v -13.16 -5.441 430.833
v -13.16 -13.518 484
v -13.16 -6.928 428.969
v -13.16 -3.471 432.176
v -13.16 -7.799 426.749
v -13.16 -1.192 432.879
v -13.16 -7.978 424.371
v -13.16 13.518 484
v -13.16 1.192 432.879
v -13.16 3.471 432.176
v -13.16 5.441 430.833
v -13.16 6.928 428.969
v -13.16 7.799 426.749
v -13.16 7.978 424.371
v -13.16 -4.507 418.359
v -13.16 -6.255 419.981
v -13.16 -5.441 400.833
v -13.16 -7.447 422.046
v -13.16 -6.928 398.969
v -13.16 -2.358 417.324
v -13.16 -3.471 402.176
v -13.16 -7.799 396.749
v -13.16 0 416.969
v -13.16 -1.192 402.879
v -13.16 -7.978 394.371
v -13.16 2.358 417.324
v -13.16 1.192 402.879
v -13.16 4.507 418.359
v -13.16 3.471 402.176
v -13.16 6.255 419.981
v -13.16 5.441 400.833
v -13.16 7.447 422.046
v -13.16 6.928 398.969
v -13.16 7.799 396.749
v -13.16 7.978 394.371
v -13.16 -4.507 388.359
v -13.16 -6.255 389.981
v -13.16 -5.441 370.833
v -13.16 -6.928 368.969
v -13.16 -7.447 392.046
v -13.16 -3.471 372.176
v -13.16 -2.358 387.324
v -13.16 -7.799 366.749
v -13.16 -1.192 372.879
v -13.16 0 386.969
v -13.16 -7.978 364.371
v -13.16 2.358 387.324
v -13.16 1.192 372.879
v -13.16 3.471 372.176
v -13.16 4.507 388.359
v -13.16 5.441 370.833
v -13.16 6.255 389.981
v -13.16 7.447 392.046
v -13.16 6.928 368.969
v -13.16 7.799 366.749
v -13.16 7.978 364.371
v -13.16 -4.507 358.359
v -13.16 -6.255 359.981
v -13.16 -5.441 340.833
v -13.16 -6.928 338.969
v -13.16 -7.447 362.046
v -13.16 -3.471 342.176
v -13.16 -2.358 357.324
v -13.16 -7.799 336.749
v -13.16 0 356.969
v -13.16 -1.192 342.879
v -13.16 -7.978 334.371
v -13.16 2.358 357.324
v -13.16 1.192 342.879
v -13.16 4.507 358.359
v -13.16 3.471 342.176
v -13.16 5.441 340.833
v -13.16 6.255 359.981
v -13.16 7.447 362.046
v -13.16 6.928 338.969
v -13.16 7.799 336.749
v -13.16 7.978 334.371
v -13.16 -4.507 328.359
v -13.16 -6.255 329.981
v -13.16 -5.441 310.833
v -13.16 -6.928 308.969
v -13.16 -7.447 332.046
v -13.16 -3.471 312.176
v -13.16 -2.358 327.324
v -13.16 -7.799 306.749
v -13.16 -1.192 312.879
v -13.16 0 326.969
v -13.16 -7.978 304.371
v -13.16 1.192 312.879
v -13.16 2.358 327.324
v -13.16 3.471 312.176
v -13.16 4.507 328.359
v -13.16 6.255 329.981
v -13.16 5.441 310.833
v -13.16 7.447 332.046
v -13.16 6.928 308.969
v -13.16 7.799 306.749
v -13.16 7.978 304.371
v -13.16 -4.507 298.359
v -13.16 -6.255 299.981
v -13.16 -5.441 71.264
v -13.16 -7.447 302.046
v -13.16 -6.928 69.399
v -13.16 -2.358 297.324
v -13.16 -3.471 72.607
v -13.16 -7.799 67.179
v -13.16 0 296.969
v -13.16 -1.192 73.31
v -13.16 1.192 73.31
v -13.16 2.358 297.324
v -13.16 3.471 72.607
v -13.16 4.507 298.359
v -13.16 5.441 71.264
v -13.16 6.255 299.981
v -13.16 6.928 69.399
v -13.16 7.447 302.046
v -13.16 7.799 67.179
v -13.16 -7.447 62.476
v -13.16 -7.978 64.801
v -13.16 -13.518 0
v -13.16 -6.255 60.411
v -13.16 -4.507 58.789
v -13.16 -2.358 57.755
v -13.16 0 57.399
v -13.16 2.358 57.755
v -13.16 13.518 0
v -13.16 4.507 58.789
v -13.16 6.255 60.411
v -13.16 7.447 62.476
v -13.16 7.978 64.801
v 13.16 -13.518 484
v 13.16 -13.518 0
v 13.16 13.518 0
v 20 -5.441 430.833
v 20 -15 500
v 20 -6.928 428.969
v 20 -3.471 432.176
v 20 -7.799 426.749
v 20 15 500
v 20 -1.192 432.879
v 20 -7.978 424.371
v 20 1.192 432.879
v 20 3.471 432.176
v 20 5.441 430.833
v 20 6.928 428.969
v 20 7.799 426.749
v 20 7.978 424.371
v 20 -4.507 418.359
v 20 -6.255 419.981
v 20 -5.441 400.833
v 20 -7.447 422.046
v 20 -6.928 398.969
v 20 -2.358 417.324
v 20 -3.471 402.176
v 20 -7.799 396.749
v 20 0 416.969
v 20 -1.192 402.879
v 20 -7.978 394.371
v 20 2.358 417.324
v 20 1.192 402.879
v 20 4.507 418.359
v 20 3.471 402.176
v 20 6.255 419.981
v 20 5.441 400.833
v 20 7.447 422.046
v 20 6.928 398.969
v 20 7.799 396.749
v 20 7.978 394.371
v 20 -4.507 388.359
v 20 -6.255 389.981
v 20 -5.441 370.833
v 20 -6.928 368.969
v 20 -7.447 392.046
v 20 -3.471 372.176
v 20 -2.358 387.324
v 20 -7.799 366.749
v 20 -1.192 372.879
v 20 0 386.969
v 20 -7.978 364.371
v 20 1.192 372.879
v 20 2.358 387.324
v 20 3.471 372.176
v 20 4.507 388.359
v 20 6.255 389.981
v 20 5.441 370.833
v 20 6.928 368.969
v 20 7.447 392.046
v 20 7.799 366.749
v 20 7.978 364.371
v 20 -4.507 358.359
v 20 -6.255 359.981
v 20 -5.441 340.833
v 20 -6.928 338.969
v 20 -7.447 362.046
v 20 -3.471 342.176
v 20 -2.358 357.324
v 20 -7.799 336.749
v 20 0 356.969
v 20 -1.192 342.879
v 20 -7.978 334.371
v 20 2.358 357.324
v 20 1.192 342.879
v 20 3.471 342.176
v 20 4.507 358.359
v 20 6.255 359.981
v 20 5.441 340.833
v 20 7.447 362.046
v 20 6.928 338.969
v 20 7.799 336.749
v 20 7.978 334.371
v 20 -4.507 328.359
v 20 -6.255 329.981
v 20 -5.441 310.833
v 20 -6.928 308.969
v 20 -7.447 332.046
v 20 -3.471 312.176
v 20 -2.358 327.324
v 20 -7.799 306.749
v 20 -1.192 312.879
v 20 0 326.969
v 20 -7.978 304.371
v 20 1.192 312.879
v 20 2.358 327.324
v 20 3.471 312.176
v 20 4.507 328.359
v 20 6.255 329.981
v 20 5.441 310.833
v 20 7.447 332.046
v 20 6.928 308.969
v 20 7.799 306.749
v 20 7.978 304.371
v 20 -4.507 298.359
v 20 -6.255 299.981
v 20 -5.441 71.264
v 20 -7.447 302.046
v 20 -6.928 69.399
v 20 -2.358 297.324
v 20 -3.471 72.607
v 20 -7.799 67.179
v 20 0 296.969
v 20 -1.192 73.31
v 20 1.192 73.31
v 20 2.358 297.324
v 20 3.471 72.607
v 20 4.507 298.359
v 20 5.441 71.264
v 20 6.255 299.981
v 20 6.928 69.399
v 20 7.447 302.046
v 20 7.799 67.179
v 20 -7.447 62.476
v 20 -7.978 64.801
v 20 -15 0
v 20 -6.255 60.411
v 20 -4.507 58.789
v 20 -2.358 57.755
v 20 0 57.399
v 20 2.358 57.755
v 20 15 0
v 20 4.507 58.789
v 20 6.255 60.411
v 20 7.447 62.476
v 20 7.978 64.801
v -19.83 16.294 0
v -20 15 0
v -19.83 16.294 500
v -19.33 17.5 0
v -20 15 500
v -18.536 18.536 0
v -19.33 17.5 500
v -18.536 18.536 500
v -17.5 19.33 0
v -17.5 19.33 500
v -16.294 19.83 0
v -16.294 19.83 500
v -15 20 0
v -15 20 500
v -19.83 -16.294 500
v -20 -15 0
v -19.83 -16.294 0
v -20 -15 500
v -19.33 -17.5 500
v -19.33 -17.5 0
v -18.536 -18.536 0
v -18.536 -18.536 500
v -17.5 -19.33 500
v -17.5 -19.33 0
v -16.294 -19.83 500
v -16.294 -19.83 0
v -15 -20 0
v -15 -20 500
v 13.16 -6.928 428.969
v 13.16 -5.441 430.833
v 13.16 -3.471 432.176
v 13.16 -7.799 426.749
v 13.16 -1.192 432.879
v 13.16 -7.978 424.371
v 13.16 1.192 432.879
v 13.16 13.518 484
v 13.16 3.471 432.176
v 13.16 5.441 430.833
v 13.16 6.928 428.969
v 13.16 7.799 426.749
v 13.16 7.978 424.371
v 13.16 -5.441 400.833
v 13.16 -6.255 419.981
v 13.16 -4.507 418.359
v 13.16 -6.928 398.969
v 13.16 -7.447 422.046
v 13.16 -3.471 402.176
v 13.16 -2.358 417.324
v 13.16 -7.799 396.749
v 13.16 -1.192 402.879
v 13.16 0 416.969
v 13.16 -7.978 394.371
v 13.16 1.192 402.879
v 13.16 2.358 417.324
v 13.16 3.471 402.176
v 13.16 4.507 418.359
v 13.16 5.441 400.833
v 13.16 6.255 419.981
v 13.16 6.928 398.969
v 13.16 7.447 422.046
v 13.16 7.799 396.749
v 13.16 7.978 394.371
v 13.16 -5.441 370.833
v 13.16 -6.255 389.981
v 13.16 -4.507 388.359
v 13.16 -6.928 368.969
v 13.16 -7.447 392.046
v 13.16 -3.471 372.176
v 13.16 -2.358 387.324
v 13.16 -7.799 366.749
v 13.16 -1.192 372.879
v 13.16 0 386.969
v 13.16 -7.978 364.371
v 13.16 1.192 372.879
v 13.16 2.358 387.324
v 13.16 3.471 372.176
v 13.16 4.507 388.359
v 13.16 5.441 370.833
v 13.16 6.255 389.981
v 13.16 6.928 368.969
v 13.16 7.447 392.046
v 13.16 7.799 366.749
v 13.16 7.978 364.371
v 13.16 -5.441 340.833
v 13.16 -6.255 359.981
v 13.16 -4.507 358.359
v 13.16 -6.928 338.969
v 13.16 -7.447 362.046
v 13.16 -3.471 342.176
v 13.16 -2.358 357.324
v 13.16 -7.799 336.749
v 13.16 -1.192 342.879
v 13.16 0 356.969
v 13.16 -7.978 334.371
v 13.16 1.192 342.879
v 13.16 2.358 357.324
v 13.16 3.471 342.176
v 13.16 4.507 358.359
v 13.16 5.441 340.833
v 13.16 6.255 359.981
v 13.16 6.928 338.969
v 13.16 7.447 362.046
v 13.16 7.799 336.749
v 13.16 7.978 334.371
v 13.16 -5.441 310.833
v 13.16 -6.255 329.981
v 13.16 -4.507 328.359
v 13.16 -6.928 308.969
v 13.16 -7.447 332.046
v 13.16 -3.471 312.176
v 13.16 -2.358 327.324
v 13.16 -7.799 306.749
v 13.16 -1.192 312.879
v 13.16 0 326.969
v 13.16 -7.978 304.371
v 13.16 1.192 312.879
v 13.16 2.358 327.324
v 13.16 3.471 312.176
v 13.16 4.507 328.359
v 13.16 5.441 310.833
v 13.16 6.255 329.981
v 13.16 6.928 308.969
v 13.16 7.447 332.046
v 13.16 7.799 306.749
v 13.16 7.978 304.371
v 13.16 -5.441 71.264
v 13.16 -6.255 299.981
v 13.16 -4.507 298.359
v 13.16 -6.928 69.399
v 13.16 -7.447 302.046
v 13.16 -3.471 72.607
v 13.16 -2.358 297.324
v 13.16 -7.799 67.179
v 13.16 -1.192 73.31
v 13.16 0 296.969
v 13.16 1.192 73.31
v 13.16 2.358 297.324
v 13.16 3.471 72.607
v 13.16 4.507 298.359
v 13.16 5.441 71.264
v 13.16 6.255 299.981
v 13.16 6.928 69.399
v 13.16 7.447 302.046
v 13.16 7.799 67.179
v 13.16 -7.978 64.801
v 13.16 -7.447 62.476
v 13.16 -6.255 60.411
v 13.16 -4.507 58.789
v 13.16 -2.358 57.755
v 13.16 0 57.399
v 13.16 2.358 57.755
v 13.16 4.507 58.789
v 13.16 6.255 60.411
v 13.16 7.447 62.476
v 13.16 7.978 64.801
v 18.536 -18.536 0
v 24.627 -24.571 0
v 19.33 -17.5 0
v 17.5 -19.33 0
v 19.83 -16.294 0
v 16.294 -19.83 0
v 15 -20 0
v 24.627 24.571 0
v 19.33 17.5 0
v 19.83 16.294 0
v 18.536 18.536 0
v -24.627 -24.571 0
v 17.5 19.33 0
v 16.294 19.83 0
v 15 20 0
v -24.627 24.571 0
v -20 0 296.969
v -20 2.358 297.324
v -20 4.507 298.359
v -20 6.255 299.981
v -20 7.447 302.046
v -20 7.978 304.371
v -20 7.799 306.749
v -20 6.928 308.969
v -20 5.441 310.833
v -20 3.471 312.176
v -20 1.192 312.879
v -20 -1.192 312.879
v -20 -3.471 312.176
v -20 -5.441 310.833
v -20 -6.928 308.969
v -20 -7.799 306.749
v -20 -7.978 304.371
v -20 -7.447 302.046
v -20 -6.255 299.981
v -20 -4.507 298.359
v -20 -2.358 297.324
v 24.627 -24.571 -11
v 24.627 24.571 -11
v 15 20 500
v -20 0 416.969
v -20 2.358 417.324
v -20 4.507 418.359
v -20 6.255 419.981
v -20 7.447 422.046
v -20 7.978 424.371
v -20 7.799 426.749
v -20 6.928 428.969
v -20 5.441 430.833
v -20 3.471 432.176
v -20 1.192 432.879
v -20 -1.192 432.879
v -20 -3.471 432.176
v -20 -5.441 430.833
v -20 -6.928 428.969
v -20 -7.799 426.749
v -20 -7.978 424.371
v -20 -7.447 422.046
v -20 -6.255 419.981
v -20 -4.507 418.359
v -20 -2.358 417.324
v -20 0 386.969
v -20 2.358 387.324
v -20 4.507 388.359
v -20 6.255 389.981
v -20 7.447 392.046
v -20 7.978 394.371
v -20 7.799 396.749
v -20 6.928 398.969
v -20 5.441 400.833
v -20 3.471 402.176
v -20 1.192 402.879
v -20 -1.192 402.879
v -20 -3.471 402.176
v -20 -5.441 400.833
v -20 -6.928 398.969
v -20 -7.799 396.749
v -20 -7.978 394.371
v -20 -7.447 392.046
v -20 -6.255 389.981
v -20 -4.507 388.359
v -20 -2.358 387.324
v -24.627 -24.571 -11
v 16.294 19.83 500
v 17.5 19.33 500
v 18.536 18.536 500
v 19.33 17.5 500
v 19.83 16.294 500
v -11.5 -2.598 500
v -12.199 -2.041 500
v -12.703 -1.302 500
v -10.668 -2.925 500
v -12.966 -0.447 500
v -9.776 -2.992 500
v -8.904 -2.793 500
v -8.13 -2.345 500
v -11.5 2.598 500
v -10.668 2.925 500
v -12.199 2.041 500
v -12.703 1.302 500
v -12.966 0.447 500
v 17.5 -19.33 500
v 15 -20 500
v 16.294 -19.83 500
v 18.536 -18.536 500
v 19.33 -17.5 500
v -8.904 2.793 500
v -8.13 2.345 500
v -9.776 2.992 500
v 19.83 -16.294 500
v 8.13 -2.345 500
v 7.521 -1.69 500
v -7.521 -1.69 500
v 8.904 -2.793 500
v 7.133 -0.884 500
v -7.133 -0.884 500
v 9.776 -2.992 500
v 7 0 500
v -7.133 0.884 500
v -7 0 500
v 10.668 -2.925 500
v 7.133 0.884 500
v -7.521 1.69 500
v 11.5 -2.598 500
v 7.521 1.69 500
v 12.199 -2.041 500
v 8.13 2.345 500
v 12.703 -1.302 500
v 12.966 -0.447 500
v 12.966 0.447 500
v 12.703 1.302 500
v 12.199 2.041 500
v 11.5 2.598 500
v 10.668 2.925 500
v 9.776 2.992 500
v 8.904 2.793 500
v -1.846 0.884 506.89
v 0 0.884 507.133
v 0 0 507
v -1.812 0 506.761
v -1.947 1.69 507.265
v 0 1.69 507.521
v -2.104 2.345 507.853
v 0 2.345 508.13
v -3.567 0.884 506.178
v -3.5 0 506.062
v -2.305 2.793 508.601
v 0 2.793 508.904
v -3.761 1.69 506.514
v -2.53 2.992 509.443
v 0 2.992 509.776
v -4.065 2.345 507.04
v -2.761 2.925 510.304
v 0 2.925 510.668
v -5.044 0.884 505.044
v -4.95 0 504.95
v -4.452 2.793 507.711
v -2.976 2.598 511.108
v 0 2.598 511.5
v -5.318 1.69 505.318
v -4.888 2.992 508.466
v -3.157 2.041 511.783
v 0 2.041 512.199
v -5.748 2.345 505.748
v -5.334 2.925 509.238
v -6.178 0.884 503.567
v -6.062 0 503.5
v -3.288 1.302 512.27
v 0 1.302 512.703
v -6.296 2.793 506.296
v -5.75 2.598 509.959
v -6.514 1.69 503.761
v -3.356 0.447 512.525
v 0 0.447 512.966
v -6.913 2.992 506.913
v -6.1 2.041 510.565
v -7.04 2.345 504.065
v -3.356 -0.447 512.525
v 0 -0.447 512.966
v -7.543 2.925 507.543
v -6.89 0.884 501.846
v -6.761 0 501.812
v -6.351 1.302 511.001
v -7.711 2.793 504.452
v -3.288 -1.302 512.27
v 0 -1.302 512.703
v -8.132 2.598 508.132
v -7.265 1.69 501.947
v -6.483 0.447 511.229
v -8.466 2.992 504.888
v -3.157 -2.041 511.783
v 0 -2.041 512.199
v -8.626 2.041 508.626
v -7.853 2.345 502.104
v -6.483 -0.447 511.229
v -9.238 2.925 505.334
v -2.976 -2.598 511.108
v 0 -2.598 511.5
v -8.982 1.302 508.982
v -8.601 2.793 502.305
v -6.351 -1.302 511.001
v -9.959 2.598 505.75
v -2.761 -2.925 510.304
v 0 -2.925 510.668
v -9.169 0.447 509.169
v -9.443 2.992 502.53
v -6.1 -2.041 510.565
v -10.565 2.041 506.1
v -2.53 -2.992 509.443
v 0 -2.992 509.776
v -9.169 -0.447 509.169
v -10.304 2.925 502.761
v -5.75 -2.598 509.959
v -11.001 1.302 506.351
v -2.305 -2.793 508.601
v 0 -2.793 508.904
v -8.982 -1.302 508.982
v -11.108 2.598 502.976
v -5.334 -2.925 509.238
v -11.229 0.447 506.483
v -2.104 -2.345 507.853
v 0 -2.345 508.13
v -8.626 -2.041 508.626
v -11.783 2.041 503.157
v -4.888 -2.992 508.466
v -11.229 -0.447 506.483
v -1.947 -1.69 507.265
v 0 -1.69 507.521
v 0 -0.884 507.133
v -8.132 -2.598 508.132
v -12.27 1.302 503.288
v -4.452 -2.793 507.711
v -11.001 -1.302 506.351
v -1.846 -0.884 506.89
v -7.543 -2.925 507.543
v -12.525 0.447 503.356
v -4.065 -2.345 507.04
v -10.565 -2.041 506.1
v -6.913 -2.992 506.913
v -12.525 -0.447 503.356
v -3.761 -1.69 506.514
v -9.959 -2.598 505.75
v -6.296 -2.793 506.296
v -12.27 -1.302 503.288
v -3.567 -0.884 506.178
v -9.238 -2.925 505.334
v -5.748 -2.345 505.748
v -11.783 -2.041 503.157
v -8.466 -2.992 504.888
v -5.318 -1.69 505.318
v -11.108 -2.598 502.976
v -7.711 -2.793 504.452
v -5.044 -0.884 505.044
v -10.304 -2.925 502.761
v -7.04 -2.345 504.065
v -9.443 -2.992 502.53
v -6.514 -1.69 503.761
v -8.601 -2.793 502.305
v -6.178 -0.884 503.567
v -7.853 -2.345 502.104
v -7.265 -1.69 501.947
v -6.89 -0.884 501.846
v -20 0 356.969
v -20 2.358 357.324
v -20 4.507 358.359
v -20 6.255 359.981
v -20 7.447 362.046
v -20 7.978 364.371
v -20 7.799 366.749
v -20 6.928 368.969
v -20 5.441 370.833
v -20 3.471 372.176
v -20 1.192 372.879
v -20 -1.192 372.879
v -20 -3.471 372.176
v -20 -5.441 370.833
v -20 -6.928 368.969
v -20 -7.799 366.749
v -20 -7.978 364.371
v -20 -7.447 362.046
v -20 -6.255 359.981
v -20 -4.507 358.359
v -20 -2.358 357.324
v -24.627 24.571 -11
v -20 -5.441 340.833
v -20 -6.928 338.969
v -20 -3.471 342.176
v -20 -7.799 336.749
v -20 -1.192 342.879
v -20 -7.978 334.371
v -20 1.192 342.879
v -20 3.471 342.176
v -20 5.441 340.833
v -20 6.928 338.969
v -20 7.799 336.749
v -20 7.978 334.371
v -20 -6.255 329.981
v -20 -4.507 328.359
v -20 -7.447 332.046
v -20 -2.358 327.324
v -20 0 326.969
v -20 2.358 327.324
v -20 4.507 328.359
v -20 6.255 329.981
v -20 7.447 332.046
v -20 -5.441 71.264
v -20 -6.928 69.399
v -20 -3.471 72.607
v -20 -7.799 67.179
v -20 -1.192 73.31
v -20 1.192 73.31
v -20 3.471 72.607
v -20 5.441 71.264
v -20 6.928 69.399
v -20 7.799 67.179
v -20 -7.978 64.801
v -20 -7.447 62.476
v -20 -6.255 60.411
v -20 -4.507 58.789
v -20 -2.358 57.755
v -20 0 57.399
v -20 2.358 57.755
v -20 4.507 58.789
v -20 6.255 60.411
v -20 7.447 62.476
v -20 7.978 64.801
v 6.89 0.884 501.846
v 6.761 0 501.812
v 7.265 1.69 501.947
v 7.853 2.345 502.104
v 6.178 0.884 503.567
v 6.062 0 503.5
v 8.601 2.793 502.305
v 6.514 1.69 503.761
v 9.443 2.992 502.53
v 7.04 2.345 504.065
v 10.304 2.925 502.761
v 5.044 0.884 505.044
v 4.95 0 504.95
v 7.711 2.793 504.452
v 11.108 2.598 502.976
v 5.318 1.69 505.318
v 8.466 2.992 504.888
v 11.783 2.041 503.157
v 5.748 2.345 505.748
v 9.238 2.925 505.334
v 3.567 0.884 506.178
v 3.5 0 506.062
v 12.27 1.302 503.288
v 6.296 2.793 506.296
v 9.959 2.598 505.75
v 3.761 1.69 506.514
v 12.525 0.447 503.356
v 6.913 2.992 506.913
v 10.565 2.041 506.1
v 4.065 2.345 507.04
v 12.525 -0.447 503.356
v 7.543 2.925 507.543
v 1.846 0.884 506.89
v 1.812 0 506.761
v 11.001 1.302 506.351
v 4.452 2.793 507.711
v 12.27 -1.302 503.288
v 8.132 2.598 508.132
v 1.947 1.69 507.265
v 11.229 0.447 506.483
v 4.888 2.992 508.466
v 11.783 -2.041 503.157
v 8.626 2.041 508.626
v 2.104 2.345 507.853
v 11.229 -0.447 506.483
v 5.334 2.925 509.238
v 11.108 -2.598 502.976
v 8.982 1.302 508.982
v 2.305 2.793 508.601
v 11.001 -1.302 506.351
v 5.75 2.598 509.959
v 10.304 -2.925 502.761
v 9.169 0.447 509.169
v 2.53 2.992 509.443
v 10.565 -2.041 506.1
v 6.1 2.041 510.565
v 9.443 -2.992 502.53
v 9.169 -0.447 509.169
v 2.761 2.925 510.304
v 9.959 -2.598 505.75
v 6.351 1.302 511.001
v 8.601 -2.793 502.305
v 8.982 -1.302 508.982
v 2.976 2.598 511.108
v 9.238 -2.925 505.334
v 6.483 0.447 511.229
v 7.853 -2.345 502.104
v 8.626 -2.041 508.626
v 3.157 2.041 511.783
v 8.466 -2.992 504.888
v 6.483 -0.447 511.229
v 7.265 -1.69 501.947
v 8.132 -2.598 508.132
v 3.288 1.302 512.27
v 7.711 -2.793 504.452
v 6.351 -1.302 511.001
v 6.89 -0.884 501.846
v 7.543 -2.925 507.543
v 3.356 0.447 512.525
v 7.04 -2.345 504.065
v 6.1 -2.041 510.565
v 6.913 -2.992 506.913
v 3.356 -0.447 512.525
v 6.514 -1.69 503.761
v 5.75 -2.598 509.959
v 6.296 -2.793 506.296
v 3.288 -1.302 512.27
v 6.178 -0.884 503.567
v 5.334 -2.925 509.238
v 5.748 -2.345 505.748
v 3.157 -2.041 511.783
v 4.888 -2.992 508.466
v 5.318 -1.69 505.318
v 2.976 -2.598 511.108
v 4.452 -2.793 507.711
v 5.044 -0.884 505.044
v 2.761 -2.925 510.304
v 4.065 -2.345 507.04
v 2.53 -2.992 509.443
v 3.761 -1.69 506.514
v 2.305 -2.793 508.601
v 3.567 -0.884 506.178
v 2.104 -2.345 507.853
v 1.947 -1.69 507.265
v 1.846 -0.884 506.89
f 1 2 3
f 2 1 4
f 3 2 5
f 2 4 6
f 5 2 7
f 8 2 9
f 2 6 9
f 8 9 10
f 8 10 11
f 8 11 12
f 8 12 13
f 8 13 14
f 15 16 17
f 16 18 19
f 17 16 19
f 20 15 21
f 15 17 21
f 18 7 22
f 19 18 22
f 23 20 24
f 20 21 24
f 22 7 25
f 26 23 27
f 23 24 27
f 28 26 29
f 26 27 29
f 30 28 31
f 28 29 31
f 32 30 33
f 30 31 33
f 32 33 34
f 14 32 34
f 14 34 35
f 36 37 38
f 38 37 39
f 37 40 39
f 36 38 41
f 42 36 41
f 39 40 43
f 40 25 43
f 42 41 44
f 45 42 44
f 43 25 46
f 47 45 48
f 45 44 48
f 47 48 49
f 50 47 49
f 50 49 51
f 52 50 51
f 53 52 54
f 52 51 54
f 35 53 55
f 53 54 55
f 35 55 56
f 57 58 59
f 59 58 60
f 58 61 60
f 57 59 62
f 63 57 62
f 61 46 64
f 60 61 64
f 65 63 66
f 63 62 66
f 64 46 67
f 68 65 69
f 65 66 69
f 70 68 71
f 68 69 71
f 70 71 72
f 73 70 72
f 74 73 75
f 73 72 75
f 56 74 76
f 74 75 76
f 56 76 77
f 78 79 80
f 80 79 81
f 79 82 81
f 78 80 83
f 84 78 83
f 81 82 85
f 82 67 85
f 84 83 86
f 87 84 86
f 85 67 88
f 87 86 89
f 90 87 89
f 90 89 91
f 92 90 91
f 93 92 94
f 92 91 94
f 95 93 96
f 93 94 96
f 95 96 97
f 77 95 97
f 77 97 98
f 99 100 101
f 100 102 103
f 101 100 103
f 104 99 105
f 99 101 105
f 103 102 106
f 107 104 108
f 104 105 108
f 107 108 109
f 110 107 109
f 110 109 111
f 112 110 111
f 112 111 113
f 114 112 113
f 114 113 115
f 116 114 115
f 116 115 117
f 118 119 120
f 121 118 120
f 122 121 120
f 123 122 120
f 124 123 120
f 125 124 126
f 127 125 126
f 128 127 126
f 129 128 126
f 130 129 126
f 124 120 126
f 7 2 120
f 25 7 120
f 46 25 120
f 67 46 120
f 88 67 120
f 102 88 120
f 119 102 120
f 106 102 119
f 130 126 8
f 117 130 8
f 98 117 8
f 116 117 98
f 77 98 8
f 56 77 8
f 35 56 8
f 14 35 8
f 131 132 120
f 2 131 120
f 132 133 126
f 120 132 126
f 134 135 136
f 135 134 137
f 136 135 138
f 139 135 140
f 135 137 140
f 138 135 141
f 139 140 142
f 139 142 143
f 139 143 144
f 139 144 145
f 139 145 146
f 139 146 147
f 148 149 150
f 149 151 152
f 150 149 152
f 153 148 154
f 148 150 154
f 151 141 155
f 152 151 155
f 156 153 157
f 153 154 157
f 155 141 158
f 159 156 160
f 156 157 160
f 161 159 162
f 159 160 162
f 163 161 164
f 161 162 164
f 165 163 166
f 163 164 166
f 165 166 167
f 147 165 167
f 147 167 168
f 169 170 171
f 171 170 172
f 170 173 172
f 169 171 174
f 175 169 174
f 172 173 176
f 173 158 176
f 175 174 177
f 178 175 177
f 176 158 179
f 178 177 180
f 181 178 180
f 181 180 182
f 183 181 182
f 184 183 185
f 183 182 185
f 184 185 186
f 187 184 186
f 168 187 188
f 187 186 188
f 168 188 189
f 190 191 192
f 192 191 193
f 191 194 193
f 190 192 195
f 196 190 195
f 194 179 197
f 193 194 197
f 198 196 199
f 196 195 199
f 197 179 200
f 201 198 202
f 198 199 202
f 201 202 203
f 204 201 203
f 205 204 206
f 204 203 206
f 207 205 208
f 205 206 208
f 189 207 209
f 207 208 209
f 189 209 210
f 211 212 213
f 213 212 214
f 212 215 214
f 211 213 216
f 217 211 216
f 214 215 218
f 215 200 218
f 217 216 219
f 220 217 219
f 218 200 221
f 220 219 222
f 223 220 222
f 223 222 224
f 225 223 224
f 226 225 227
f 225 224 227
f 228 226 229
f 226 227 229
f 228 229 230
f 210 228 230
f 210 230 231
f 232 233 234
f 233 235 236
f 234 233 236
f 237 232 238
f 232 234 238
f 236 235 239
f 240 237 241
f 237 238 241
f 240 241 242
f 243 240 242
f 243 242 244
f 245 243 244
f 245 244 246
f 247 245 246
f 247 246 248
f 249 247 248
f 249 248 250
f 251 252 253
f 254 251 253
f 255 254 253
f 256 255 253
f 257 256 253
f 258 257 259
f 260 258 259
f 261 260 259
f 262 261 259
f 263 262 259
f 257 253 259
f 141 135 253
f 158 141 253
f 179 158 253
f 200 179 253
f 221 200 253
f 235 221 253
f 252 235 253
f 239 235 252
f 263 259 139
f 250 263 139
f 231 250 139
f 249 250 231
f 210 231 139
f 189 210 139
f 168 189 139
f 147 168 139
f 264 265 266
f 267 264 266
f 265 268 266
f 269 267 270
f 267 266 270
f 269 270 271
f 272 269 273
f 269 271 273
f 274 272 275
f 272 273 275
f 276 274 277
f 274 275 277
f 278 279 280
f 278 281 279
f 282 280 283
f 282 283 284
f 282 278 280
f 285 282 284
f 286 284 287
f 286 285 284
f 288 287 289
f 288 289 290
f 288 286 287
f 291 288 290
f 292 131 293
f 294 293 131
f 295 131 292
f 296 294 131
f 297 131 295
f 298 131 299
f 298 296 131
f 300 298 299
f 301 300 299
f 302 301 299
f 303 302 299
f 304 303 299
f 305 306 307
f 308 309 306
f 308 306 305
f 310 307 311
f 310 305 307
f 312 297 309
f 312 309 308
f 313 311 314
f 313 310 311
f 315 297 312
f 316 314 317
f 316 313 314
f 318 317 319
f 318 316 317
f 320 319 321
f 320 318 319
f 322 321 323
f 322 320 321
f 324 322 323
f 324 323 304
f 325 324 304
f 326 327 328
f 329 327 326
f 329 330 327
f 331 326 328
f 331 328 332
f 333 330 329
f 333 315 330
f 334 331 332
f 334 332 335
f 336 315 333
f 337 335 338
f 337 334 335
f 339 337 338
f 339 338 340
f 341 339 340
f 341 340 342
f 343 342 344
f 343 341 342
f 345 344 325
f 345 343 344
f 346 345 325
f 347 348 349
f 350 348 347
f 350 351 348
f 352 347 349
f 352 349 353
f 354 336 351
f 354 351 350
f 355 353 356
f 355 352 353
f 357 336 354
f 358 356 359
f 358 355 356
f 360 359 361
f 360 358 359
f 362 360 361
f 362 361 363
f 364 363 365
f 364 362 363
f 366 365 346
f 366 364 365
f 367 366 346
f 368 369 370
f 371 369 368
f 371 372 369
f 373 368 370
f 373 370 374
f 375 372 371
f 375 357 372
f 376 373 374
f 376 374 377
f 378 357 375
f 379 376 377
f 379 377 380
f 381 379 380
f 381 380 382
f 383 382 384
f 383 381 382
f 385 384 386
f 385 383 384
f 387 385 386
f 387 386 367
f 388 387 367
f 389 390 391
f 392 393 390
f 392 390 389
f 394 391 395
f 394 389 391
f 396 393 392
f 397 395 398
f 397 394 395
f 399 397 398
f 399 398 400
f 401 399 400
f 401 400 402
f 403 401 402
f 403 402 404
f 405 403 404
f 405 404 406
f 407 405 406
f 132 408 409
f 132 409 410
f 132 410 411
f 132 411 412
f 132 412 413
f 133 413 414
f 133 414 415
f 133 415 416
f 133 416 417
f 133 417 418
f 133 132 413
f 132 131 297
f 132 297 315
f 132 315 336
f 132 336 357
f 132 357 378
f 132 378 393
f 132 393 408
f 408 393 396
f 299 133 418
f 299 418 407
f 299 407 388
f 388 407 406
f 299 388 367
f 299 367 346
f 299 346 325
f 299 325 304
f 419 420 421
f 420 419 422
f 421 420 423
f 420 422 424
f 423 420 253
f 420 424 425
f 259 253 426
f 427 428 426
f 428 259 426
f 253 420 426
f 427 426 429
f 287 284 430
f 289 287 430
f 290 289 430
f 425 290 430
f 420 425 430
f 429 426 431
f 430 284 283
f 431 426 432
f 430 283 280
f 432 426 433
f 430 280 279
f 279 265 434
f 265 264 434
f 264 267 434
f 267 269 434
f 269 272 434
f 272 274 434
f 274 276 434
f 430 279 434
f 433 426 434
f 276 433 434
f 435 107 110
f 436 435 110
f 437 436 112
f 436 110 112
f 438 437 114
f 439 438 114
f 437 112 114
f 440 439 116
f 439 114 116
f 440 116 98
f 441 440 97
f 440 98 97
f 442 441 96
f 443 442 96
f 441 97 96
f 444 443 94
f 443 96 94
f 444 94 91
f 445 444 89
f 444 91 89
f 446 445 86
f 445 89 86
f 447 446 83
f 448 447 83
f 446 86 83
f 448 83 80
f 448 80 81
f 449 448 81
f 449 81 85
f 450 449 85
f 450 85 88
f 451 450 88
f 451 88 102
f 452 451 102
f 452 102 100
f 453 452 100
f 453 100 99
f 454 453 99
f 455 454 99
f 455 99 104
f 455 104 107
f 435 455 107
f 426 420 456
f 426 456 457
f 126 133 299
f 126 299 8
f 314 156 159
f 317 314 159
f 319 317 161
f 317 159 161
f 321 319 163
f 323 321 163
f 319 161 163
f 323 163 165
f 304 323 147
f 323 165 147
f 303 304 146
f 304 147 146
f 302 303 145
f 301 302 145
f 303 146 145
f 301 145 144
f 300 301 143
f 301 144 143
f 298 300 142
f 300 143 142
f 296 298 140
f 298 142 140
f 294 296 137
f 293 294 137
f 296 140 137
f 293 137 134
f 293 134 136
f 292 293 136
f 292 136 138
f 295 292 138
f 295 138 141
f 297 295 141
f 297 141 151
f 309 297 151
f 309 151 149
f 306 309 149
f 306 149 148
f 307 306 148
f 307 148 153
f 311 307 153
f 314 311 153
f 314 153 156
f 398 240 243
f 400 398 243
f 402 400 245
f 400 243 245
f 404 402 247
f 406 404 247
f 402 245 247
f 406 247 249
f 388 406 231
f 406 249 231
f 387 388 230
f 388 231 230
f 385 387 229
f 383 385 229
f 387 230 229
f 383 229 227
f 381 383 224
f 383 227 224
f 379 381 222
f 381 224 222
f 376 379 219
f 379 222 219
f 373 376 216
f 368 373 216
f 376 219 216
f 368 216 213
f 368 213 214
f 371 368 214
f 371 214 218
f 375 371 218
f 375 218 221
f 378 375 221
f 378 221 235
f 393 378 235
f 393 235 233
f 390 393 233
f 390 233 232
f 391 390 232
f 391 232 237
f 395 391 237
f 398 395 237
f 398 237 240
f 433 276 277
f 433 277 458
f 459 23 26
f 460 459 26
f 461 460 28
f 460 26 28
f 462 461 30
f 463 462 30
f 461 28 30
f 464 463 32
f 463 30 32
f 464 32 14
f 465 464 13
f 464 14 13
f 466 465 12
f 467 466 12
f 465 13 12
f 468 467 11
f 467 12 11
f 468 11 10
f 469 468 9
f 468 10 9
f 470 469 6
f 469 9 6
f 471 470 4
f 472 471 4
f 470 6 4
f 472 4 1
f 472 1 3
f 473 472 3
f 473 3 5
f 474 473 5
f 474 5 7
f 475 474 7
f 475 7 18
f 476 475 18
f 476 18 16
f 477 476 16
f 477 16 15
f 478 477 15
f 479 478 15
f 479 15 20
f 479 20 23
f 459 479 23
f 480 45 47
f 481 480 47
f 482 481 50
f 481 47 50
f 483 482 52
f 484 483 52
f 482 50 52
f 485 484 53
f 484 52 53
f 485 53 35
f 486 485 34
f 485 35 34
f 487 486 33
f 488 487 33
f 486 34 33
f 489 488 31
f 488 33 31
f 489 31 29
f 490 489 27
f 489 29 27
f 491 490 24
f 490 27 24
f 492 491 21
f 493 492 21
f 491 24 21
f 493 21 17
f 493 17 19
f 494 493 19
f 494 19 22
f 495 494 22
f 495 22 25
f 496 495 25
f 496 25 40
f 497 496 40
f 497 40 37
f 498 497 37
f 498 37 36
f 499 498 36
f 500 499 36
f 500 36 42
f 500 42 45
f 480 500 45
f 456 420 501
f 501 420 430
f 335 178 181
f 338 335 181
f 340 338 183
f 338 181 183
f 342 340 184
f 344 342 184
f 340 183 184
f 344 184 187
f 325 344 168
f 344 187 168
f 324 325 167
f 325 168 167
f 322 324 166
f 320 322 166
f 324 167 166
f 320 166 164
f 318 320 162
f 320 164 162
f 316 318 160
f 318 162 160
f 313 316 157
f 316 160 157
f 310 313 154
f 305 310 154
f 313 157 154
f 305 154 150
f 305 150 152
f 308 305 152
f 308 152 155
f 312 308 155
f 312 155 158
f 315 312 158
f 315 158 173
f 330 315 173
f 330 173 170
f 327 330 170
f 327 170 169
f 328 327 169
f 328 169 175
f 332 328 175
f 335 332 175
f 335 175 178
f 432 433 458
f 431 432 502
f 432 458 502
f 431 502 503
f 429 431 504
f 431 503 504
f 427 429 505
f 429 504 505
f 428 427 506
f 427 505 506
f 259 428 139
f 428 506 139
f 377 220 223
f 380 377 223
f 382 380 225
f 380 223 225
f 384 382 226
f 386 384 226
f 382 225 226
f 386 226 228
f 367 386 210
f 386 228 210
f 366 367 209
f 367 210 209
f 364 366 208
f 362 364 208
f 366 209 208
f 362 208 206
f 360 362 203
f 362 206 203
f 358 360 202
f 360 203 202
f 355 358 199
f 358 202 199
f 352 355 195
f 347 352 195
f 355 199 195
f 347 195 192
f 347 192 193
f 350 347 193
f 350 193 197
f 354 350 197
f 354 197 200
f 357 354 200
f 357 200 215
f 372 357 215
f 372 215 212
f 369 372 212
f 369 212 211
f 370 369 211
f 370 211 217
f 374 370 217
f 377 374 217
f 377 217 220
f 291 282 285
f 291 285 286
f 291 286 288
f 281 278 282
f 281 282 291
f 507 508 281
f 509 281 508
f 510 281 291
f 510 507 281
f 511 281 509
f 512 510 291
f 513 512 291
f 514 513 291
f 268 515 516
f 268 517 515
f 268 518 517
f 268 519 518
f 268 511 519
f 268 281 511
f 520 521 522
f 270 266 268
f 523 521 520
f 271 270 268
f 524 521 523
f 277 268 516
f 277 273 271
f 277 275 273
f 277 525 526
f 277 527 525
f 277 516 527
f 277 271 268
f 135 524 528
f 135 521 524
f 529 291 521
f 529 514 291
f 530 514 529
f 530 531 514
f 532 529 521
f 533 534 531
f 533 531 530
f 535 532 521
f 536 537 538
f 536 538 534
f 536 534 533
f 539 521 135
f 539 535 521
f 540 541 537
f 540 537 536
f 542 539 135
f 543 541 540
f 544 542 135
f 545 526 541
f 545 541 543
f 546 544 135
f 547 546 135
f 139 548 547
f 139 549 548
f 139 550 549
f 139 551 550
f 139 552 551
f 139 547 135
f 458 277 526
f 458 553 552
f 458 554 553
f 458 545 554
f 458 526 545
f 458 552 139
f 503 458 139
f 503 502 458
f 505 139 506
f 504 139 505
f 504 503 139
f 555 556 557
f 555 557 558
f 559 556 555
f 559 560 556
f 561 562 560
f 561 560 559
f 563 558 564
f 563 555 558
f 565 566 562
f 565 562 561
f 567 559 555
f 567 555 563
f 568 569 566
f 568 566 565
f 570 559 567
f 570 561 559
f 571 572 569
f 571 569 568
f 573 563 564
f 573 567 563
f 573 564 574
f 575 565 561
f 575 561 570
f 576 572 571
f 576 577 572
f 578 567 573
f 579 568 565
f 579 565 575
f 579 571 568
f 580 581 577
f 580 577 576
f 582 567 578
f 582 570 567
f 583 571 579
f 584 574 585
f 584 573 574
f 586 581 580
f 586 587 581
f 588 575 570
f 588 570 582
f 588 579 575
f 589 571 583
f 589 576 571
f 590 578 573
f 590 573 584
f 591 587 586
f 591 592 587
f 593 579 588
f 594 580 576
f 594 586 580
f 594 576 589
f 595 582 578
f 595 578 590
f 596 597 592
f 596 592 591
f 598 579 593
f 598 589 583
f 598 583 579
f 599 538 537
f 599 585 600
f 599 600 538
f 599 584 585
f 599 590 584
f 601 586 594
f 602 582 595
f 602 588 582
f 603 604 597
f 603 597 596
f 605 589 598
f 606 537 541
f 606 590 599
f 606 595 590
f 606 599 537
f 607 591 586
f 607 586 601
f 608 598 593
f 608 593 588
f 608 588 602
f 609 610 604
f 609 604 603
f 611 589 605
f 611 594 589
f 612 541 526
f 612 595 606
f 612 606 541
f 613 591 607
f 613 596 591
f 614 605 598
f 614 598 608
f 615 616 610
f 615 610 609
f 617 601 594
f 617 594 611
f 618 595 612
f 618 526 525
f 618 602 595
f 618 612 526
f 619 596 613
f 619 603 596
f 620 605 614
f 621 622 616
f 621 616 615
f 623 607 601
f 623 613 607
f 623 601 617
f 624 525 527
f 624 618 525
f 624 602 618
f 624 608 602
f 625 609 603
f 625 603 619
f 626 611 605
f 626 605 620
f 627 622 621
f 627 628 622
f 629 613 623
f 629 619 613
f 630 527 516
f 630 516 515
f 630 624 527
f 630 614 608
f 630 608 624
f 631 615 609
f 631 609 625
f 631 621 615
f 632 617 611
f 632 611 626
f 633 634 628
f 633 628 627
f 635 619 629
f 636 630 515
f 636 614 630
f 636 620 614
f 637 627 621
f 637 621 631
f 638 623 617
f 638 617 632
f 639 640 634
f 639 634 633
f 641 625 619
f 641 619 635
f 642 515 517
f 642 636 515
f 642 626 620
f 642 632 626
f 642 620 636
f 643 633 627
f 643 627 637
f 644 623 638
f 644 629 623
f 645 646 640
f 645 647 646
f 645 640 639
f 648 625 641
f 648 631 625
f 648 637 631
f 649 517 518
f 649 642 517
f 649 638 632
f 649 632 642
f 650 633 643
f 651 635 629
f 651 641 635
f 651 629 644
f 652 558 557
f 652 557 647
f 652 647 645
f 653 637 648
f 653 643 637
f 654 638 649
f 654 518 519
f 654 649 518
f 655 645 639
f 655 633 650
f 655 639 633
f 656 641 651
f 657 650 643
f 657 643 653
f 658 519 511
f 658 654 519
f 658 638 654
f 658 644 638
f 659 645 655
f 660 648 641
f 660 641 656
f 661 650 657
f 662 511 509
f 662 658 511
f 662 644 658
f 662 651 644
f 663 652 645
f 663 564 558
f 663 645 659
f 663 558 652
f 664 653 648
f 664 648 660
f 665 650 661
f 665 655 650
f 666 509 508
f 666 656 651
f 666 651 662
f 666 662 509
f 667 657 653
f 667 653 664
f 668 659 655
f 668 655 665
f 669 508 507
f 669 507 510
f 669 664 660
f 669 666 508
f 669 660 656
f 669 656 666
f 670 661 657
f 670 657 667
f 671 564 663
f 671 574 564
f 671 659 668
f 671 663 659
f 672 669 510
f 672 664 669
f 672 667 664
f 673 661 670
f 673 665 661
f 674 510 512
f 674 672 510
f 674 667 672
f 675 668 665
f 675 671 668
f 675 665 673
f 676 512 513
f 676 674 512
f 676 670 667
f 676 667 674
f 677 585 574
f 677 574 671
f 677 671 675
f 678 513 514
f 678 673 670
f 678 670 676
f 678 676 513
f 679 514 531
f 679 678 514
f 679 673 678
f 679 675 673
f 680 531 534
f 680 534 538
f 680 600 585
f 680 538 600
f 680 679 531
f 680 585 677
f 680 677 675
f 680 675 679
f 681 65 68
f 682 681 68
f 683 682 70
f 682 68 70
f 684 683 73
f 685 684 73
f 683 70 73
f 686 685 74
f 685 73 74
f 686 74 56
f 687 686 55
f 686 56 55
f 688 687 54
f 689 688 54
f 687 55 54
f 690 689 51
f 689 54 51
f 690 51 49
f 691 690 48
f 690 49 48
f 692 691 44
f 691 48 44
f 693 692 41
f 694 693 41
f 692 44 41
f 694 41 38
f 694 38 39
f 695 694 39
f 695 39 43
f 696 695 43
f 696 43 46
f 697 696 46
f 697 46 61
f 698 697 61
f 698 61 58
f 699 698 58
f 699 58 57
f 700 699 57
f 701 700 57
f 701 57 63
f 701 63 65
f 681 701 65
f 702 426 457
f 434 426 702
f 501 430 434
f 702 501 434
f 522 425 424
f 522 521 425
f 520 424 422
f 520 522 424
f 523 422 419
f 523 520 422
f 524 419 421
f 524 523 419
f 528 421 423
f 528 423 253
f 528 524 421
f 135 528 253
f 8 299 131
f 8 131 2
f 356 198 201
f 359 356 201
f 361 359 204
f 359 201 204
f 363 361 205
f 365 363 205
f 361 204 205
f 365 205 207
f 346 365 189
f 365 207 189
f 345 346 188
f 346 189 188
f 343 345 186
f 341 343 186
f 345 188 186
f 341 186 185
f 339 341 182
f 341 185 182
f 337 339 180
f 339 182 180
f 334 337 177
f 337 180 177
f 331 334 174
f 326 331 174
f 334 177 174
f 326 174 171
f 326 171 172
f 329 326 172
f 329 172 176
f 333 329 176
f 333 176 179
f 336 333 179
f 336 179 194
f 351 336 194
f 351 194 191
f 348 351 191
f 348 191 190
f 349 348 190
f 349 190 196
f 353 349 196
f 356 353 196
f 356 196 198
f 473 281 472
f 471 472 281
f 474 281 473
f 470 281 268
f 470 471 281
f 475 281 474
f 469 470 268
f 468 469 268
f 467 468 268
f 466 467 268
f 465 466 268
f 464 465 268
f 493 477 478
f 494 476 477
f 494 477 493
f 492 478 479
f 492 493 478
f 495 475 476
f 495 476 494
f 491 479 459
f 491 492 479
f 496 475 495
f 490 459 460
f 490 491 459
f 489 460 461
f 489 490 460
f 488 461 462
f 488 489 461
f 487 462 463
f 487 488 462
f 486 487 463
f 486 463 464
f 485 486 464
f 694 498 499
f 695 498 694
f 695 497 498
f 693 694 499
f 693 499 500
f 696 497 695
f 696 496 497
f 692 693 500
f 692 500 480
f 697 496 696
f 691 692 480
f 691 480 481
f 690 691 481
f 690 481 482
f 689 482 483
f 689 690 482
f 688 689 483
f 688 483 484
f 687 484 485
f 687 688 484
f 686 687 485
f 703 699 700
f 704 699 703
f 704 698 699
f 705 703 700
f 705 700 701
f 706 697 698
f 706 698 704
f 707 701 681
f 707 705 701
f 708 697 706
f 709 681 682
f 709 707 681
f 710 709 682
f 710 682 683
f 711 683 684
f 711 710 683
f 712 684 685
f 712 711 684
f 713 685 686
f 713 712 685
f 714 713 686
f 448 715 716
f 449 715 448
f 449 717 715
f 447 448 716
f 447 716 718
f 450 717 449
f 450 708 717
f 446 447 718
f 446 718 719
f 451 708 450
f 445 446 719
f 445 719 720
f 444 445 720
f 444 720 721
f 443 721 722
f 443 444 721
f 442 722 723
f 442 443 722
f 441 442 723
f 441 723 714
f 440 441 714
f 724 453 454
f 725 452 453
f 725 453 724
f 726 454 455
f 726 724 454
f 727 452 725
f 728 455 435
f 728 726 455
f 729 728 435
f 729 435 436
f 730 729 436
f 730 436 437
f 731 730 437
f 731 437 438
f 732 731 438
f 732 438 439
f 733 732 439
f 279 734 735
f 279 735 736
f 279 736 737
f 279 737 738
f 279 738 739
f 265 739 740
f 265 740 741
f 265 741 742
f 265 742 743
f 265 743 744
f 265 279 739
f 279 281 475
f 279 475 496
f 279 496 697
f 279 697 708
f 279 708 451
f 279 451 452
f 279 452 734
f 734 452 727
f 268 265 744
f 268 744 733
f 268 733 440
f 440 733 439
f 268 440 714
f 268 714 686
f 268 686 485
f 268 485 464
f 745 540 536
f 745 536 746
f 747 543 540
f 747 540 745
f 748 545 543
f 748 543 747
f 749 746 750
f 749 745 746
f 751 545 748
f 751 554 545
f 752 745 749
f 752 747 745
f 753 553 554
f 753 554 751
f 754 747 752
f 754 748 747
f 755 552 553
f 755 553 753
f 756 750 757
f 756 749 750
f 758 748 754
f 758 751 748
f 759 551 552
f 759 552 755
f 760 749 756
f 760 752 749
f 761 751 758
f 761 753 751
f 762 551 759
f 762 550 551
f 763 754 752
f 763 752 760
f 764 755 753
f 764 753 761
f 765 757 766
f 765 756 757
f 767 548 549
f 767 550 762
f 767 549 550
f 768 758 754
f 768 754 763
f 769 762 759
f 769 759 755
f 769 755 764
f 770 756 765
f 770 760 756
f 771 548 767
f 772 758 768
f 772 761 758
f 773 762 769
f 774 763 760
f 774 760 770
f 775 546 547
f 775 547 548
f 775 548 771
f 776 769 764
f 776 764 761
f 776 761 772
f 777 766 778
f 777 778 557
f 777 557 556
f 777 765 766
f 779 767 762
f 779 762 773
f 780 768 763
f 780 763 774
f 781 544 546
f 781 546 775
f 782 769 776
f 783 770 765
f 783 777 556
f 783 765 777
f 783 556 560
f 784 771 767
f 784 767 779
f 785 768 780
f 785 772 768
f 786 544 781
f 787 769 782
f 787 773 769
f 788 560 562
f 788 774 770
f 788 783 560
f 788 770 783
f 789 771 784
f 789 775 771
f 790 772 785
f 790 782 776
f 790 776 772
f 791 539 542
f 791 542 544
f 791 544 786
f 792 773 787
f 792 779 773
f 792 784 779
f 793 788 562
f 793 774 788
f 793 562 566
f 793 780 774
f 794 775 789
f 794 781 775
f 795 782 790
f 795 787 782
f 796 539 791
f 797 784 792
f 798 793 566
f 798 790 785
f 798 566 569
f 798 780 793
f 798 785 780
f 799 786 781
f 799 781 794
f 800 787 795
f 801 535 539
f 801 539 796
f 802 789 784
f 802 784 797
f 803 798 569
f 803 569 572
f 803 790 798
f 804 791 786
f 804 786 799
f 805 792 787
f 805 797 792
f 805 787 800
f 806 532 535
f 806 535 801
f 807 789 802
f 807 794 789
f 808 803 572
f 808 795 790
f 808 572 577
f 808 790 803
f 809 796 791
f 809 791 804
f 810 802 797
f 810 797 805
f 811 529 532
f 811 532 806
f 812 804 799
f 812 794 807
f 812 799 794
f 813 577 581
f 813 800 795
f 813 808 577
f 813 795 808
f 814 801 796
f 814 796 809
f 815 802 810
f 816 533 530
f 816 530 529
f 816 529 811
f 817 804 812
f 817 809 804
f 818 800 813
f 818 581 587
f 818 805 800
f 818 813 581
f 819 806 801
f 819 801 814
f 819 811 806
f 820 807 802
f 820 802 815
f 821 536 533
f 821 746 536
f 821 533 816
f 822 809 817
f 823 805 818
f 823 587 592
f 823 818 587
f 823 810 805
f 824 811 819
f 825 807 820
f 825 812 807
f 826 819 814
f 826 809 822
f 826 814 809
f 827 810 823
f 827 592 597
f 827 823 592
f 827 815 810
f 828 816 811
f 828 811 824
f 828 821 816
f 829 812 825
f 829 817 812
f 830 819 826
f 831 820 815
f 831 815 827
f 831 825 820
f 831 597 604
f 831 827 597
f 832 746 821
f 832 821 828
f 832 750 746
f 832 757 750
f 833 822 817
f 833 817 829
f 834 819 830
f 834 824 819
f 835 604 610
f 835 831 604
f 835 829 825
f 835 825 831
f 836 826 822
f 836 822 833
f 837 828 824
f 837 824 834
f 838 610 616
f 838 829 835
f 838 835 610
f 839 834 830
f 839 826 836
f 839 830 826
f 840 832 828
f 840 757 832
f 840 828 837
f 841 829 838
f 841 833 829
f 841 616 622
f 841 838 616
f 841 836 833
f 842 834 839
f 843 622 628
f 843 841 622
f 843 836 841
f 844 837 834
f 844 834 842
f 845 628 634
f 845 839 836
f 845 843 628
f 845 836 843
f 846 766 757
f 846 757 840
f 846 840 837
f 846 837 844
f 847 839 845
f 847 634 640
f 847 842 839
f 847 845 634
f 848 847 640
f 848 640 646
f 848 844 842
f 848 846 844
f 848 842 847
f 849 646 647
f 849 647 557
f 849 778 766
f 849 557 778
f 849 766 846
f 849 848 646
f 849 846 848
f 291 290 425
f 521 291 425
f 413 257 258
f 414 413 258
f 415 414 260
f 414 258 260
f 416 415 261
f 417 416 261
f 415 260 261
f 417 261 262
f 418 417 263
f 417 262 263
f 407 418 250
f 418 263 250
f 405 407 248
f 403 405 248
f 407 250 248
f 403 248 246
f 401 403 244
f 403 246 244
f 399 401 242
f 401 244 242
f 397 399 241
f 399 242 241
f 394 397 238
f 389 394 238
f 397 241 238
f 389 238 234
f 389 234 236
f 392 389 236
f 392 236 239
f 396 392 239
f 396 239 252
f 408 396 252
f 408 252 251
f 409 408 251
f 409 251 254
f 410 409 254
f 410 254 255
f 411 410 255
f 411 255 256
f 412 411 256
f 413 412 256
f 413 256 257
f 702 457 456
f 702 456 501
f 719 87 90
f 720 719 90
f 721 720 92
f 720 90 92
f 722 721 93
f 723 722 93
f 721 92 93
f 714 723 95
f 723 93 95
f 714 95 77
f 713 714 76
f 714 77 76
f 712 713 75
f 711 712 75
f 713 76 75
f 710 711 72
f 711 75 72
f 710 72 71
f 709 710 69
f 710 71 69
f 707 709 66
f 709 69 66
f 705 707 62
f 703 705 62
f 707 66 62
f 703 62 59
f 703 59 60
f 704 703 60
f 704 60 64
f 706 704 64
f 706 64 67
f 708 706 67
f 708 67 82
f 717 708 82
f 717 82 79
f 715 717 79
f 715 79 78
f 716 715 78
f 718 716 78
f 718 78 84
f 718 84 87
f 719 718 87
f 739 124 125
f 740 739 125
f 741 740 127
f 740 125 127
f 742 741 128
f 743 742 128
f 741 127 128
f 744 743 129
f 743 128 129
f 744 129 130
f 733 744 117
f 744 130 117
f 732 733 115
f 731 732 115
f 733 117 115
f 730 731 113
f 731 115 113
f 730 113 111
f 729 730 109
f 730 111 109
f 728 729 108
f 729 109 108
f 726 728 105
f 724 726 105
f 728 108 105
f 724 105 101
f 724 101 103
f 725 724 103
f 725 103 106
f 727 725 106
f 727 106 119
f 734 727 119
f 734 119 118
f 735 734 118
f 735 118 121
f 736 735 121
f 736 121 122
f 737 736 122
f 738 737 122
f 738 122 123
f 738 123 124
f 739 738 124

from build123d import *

# Parameters (mm, degrees)
SKETCH1_W           = 40
SKETCH1_H           = 40
BOSS_EXTRUDE1_DEPTH = 500
SKETCH2_R           = 3
FILLET1_R           = 5
SKETCH4_W           = 26.319455472
SKETCH4_H           = 27.036606846
CUT_EXTRUDE1_DEPTH  = 484
SKETCH5_W           = 49.254498594
SKETCH5_H           = 49.142556558
BOSS_EXTRUDE3_DEPTH = 11
SKETCH6_R           = 8
CUT_EXTRUDE2_DEPTH  = 149


with BuildPart() as part:
    # Sketch1 → Boss-Extrude1 (new body)
    with BuildSketch(Plane.XY):
        Rectangle(SKETCH1_W, SKETCH1_H)
    extrude(amount=BOSS_EXTRUDE1_DEPTH)

    # Sketch2 → Revolve1 (revolve)
    with BuildSketch(Plane.XY.offset(500), mode=Mode.PRIVATE) as revolve1_sk:
        with Locations((-10, 0)):
            Circle(SKETCH2_R)
    revolve(revolve1_sk.sketch.rotate(Axis((0, 23.495779736, 500), (0, -1, 0)), 270), axis=Axis((0, 23.495779736, 500), (0, -1, 0)))

    # Fillet1
    fillet1_edges = [part.edges().sort_by_distance(p)[0] for p in [
        (20, -20, 250),
        (-20, -20, 250),
        (-20, 20, 250),
        (20, 20, 250),
    ]]
    fillet(fillet1_edges, radius=FILLET1_R)

    # Sketch4 → Cut-Extrude1 (cut)
    with BuildSketch(Plane(origin=(0, 0, 0), x_dir=(-1, 0, 0), z_dir=(0, 0, -1))):
        Rectangle(SKETCH4_W, SKETCH4_H)
    extrude(amount=-CUT_EXTRUDE1_DEPTH, mode=Mode.SUBTRACT)

    # Sketch5 → Boss-Extrude3 (add)
    with BuildSketch(Plane(origin=(0, 0, 0), x_dir=(-1, 0, 0), z_dir=(0, 0, -1))):
        Rectangle(SKETCH5_W, SKETCH5_H)
    extrude(amount=BOSS_EXTRUDE3_DEPTH)

    # Sketch6 → Cut-Extrude2 (cut)
    with BuildSketch(Plane(origin=(20, 0, 0), x_dir=(0, 0, -1), z_dir=(1, 0, 0))):
        with Locations((-65.399193922, 0)):
            Circle(SKETCH6_R)
        with Locations((-304.968679319, 0)):
            Circle(SKETCH6_R)
        with Locations((-334.968679319, 0)):
            Circle(SKETCH6_R)
        with Locations((-364.968679319, 0)):
            Circle(SKETCH6_R)
        with Locations((-394.968679319, 0)):
            Circle(SKETCH6_R)
        with Locations((-424.968679319, 0)):
            Circle(SKETCH6_R)
    extrude(amount=-CUT_EXTRUDE2_DEPTH, mode=Mode.SUBTRACT)


solid = part.part
